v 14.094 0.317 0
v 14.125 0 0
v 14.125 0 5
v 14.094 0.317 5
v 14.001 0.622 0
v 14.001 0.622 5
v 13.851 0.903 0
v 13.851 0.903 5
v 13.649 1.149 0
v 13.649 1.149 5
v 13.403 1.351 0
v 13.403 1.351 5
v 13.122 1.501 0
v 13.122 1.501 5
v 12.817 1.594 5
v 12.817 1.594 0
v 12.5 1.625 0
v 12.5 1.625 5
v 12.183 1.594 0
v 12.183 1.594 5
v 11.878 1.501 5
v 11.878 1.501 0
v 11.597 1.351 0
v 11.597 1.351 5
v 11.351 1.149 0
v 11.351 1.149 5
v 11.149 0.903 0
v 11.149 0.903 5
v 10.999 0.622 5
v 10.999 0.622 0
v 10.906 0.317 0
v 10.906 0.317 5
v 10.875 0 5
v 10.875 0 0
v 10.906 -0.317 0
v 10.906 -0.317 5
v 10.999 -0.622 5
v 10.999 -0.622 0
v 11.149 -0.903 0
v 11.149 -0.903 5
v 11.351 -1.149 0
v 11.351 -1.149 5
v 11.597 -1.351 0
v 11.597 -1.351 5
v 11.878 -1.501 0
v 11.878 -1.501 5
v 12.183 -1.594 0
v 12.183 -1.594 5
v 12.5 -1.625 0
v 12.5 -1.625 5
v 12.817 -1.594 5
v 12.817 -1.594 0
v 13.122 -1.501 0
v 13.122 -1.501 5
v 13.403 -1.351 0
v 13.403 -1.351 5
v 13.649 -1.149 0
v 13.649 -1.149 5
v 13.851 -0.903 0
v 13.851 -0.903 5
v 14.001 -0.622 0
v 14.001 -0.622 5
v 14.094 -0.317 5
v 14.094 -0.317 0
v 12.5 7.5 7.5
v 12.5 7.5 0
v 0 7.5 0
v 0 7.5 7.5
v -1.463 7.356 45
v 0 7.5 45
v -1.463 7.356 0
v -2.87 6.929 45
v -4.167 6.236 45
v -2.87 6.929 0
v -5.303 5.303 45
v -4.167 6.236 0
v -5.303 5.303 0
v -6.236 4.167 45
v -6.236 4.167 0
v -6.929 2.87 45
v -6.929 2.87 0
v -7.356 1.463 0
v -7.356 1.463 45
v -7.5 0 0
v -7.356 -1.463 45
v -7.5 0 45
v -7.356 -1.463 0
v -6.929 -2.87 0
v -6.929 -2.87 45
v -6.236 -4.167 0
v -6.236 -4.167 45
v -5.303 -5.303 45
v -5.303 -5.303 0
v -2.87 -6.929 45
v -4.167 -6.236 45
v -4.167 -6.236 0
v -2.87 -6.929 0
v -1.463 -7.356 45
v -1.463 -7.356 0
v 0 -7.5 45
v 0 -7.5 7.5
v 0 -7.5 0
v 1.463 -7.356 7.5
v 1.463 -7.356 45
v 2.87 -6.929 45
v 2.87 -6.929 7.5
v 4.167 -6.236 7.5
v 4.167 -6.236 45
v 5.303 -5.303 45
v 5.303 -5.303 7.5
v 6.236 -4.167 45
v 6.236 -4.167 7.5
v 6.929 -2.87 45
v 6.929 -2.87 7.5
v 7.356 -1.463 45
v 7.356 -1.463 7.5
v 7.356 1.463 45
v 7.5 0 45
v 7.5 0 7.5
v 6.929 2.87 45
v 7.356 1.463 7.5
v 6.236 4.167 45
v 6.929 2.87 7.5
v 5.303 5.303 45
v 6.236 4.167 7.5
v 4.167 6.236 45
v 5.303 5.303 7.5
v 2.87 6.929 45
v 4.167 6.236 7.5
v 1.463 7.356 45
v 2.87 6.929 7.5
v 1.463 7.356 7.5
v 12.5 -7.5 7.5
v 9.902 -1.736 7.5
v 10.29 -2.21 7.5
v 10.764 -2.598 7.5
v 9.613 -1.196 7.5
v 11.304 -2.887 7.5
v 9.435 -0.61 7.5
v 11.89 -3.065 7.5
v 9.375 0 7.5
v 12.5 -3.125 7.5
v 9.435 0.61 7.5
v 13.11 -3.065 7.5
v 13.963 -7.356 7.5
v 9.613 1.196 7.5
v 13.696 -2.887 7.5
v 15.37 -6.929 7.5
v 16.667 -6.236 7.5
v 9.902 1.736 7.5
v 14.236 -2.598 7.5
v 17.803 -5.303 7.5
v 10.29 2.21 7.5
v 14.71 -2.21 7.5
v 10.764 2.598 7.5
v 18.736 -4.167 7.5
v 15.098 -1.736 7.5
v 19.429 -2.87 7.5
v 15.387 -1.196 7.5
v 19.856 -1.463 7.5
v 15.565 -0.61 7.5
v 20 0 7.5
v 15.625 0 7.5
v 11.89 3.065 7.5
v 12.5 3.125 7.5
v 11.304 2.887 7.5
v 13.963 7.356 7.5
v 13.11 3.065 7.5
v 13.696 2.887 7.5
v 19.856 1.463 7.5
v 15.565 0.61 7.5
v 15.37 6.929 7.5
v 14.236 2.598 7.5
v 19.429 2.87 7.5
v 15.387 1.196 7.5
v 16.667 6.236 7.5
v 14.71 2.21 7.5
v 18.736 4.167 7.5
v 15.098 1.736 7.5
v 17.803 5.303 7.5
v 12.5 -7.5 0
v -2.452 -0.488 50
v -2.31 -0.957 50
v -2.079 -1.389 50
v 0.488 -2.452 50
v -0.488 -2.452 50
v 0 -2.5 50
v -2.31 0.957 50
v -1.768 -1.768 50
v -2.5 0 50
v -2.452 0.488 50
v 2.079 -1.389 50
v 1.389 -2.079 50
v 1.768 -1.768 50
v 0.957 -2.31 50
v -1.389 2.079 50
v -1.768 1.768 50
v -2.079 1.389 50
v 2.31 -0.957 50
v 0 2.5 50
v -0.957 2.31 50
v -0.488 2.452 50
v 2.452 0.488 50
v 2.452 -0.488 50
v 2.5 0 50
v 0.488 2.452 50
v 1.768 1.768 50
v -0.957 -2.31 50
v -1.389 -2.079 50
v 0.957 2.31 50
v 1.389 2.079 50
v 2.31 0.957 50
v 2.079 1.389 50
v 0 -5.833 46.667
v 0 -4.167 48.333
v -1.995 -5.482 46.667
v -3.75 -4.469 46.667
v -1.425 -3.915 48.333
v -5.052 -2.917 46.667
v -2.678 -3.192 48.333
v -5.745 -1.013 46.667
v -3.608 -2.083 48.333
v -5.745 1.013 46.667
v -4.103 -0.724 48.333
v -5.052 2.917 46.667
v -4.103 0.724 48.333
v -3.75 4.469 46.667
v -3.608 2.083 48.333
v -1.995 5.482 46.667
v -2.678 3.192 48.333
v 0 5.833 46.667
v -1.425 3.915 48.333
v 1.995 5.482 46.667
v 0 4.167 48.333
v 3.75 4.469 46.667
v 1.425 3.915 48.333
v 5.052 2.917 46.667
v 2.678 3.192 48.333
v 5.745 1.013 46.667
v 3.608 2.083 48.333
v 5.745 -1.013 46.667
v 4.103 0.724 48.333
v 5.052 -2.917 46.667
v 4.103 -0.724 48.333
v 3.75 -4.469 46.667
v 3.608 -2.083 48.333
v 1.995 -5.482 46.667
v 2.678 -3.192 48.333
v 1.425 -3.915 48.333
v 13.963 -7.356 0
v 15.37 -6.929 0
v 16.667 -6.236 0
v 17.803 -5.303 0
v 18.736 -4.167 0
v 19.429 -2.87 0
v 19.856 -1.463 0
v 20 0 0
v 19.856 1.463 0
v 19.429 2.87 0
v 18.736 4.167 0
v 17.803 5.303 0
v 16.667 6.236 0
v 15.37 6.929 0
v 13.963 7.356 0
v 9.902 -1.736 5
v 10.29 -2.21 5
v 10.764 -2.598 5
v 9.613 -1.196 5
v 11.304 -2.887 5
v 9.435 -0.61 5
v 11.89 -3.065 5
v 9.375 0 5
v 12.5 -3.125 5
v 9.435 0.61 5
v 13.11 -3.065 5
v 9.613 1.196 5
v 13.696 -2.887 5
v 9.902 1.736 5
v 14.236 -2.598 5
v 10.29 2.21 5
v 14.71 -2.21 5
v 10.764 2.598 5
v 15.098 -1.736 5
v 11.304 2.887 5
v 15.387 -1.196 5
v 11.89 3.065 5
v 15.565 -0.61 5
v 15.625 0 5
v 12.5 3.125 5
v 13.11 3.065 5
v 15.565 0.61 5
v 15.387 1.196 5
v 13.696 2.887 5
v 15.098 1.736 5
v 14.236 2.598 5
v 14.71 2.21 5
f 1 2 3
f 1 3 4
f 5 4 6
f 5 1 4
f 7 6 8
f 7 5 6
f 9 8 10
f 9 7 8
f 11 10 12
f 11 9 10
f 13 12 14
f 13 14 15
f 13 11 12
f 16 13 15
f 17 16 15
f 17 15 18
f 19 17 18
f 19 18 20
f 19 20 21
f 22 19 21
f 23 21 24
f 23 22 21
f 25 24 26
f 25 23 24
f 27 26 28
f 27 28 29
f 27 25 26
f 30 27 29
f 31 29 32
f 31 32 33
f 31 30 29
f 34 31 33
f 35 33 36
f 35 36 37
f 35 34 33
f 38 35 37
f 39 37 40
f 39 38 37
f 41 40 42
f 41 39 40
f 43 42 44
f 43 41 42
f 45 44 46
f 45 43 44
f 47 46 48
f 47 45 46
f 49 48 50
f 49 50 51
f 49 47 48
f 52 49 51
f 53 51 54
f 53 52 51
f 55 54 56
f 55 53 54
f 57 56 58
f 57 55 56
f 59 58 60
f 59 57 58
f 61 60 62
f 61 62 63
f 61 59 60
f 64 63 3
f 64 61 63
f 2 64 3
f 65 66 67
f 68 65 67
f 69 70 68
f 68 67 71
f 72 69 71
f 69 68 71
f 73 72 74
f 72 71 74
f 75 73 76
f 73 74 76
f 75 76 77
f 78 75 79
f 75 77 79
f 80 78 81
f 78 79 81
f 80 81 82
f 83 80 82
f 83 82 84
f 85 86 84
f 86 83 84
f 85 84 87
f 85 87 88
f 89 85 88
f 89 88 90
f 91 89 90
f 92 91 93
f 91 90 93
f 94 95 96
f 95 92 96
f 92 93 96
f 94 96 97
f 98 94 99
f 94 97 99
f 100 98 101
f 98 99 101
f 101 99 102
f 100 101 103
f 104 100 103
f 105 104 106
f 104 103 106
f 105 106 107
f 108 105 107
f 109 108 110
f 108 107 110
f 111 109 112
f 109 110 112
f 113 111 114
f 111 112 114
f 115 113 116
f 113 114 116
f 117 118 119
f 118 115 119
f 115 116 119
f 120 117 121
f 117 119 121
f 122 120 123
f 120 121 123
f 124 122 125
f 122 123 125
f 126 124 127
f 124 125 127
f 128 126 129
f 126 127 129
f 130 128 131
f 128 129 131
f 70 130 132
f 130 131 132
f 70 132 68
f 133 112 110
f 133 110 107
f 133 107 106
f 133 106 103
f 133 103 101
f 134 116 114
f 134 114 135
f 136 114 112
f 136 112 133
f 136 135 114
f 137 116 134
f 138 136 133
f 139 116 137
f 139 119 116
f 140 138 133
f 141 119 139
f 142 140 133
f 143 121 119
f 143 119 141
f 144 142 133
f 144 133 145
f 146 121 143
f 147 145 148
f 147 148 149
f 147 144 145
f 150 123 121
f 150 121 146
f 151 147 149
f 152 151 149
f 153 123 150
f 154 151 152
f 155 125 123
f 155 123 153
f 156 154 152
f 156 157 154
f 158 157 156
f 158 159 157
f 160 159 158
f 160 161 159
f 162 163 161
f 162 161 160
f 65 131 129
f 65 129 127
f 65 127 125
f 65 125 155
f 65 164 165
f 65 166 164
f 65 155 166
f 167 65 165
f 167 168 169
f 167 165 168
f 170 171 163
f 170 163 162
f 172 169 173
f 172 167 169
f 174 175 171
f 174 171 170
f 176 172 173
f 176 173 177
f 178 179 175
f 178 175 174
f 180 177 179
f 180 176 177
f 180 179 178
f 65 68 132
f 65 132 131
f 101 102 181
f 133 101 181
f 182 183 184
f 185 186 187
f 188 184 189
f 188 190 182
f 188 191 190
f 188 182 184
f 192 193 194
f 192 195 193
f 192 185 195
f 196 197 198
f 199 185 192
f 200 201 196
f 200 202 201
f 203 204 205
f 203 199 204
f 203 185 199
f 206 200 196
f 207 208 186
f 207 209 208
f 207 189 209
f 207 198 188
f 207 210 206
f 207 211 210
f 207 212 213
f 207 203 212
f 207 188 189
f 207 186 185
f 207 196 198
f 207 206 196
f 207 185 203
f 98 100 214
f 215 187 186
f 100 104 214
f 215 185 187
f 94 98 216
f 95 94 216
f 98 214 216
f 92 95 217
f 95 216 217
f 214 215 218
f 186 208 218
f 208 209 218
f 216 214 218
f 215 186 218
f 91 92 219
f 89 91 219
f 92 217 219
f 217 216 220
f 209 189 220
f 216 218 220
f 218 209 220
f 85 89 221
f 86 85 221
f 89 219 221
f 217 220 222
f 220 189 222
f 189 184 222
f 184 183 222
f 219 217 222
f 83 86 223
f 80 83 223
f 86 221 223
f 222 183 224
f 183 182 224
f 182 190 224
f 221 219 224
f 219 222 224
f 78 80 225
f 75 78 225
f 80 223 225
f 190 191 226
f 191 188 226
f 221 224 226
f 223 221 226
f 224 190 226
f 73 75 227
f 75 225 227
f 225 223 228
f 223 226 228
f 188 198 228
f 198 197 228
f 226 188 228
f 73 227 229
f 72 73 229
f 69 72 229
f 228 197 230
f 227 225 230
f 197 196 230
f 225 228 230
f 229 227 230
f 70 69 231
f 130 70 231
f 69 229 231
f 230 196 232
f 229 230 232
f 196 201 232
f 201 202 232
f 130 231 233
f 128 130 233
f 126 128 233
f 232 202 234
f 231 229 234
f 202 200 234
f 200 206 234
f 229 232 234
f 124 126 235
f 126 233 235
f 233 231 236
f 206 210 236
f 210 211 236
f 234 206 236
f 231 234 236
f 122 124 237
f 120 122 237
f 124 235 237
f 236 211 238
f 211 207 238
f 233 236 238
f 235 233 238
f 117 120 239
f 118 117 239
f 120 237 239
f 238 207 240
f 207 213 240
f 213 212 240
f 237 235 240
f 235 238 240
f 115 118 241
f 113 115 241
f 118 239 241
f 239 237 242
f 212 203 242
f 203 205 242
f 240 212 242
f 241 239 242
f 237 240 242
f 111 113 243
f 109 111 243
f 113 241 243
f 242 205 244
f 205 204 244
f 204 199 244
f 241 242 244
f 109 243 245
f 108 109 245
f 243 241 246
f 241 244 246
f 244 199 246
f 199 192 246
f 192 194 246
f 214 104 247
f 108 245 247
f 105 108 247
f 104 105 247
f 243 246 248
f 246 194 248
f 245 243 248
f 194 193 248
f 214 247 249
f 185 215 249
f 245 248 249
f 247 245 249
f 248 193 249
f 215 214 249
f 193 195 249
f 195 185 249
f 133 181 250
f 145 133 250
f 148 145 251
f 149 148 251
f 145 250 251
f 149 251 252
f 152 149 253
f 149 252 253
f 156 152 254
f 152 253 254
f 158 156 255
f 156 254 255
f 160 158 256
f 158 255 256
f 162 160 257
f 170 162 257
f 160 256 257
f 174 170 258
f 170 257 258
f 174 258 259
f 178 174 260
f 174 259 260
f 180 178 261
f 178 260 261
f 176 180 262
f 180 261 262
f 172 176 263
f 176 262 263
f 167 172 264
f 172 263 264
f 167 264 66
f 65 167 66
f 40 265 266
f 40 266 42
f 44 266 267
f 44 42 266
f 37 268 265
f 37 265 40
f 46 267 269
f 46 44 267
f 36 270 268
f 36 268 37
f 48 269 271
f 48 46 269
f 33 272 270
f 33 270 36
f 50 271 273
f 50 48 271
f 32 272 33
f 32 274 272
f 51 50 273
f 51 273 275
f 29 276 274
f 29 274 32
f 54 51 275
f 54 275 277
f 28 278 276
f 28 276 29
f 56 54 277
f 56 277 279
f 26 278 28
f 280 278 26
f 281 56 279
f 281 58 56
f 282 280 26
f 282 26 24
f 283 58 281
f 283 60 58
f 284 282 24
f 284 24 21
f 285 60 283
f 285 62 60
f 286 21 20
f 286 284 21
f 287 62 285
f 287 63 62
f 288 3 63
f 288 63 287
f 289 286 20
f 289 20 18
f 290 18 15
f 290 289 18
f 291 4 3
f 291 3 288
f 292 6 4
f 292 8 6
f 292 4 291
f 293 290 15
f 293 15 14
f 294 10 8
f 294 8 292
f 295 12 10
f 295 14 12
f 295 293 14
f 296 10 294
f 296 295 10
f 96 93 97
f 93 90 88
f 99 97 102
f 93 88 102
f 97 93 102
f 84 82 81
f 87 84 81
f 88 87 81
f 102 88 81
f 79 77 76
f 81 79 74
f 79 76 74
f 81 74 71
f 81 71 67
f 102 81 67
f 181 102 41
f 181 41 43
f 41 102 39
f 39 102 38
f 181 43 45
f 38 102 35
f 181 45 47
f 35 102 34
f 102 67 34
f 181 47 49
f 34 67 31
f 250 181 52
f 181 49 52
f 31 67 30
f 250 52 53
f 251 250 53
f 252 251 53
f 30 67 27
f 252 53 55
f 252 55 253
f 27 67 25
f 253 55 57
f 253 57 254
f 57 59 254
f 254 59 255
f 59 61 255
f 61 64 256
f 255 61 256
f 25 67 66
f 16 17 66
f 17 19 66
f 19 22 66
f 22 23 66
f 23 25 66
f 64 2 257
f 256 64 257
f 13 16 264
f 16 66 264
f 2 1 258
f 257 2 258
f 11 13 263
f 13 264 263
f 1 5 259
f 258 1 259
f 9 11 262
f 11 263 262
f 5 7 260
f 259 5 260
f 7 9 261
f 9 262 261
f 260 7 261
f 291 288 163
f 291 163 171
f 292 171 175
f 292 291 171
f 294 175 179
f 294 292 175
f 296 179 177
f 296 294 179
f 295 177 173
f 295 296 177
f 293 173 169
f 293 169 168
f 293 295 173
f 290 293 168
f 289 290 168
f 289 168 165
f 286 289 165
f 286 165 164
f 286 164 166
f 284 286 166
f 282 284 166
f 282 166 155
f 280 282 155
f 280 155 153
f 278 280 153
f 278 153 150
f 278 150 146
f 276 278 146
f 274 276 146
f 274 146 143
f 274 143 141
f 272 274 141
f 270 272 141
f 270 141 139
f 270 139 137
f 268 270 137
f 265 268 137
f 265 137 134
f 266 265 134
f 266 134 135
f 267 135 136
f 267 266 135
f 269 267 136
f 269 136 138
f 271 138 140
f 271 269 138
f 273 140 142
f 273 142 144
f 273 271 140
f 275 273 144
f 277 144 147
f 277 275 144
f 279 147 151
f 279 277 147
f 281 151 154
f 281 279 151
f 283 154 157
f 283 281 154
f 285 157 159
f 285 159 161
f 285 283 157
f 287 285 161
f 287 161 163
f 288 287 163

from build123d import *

# Parameters (mm, degrees)
F1_DEPTH = 50
F0_R     = 3.125
F2_DEPTH = 7.5
F0_R_2   = 1.625
F3_DEPTH = 5


# Not quite as in the source:
# - a fillet or chamfer that OpenCascade refuses, or shapes differently, is made with other operations: its cross-section is extruded or revolved along the edge and cut away or added


with BuildPart() as f1:
    # F0 (on Top) → F1 (new body)
    with BuildSketch(Plane.XY):
        with BuildLine():
            ThreePointArc((0, -7.5), (5.3033008589, -5.3033008589), (7.5, 0))
            ThreePointArc((7.5, 0), (5.3033008589, 5.3033008589), (0, 7.5))
            ThreePointArc((0, 7.5), (-7.5, 0), (0, -7.5))
        make_face()
    extrude(amount=F1_DEPTH)

    # F0 (on Top) → F2 (join)
    with BuildSketch(Plane.XY):
        with BuildLine():
            ThreePointArc((0, 7.5), (5.3033008589, 5.3033008589), (7.5, 0))
            ThreePointArc((7.5, 0), (5.3033008589, -5.3033008589), (0, -7.5))
            Line((0, -7.5), (12.5, -7.5))
            ThreePointArc((12.5, -7.5), (17.8033008589, -5.3033008589), (20, 0))
            ThreePointArc((20, 0), (17.8033008589, 5.3033008589), (12.5, 7.5))
            Line((12.5, 7.5), (0, 7.5))
        make_face()
        with Locations((12.5, 0)):
            Circle(F0_R, mode=Mode.SUBTRACT)
    extrude(amount=F2_DEPTH)

    # F0 (on Top) → F3 (join)
    with BuildSketch(Plane.XY):
        with Locations((12.5, 0)):
            Circle(F0_R)
        with Locations((12.5, 0)):
            Circle(F0_R_2, mode=Mode.SUBTRACT)
    extrude(amount=F3_DEPTH)

    # F4: chamfer of 5 on 1 edges, made by hand

    # F4_s1 → F4_t2 (revolve, cut)
    with BuildSketch(Plane.YZ):
        Polygon((-7.5, 45), (-2.5, 50), (-7.5, 50), align=None)
    revolve(axis=Axis((0, 0, 50), (0, 0, -1)), mode=Mode.SUBTRACT)


solid = f1.part
